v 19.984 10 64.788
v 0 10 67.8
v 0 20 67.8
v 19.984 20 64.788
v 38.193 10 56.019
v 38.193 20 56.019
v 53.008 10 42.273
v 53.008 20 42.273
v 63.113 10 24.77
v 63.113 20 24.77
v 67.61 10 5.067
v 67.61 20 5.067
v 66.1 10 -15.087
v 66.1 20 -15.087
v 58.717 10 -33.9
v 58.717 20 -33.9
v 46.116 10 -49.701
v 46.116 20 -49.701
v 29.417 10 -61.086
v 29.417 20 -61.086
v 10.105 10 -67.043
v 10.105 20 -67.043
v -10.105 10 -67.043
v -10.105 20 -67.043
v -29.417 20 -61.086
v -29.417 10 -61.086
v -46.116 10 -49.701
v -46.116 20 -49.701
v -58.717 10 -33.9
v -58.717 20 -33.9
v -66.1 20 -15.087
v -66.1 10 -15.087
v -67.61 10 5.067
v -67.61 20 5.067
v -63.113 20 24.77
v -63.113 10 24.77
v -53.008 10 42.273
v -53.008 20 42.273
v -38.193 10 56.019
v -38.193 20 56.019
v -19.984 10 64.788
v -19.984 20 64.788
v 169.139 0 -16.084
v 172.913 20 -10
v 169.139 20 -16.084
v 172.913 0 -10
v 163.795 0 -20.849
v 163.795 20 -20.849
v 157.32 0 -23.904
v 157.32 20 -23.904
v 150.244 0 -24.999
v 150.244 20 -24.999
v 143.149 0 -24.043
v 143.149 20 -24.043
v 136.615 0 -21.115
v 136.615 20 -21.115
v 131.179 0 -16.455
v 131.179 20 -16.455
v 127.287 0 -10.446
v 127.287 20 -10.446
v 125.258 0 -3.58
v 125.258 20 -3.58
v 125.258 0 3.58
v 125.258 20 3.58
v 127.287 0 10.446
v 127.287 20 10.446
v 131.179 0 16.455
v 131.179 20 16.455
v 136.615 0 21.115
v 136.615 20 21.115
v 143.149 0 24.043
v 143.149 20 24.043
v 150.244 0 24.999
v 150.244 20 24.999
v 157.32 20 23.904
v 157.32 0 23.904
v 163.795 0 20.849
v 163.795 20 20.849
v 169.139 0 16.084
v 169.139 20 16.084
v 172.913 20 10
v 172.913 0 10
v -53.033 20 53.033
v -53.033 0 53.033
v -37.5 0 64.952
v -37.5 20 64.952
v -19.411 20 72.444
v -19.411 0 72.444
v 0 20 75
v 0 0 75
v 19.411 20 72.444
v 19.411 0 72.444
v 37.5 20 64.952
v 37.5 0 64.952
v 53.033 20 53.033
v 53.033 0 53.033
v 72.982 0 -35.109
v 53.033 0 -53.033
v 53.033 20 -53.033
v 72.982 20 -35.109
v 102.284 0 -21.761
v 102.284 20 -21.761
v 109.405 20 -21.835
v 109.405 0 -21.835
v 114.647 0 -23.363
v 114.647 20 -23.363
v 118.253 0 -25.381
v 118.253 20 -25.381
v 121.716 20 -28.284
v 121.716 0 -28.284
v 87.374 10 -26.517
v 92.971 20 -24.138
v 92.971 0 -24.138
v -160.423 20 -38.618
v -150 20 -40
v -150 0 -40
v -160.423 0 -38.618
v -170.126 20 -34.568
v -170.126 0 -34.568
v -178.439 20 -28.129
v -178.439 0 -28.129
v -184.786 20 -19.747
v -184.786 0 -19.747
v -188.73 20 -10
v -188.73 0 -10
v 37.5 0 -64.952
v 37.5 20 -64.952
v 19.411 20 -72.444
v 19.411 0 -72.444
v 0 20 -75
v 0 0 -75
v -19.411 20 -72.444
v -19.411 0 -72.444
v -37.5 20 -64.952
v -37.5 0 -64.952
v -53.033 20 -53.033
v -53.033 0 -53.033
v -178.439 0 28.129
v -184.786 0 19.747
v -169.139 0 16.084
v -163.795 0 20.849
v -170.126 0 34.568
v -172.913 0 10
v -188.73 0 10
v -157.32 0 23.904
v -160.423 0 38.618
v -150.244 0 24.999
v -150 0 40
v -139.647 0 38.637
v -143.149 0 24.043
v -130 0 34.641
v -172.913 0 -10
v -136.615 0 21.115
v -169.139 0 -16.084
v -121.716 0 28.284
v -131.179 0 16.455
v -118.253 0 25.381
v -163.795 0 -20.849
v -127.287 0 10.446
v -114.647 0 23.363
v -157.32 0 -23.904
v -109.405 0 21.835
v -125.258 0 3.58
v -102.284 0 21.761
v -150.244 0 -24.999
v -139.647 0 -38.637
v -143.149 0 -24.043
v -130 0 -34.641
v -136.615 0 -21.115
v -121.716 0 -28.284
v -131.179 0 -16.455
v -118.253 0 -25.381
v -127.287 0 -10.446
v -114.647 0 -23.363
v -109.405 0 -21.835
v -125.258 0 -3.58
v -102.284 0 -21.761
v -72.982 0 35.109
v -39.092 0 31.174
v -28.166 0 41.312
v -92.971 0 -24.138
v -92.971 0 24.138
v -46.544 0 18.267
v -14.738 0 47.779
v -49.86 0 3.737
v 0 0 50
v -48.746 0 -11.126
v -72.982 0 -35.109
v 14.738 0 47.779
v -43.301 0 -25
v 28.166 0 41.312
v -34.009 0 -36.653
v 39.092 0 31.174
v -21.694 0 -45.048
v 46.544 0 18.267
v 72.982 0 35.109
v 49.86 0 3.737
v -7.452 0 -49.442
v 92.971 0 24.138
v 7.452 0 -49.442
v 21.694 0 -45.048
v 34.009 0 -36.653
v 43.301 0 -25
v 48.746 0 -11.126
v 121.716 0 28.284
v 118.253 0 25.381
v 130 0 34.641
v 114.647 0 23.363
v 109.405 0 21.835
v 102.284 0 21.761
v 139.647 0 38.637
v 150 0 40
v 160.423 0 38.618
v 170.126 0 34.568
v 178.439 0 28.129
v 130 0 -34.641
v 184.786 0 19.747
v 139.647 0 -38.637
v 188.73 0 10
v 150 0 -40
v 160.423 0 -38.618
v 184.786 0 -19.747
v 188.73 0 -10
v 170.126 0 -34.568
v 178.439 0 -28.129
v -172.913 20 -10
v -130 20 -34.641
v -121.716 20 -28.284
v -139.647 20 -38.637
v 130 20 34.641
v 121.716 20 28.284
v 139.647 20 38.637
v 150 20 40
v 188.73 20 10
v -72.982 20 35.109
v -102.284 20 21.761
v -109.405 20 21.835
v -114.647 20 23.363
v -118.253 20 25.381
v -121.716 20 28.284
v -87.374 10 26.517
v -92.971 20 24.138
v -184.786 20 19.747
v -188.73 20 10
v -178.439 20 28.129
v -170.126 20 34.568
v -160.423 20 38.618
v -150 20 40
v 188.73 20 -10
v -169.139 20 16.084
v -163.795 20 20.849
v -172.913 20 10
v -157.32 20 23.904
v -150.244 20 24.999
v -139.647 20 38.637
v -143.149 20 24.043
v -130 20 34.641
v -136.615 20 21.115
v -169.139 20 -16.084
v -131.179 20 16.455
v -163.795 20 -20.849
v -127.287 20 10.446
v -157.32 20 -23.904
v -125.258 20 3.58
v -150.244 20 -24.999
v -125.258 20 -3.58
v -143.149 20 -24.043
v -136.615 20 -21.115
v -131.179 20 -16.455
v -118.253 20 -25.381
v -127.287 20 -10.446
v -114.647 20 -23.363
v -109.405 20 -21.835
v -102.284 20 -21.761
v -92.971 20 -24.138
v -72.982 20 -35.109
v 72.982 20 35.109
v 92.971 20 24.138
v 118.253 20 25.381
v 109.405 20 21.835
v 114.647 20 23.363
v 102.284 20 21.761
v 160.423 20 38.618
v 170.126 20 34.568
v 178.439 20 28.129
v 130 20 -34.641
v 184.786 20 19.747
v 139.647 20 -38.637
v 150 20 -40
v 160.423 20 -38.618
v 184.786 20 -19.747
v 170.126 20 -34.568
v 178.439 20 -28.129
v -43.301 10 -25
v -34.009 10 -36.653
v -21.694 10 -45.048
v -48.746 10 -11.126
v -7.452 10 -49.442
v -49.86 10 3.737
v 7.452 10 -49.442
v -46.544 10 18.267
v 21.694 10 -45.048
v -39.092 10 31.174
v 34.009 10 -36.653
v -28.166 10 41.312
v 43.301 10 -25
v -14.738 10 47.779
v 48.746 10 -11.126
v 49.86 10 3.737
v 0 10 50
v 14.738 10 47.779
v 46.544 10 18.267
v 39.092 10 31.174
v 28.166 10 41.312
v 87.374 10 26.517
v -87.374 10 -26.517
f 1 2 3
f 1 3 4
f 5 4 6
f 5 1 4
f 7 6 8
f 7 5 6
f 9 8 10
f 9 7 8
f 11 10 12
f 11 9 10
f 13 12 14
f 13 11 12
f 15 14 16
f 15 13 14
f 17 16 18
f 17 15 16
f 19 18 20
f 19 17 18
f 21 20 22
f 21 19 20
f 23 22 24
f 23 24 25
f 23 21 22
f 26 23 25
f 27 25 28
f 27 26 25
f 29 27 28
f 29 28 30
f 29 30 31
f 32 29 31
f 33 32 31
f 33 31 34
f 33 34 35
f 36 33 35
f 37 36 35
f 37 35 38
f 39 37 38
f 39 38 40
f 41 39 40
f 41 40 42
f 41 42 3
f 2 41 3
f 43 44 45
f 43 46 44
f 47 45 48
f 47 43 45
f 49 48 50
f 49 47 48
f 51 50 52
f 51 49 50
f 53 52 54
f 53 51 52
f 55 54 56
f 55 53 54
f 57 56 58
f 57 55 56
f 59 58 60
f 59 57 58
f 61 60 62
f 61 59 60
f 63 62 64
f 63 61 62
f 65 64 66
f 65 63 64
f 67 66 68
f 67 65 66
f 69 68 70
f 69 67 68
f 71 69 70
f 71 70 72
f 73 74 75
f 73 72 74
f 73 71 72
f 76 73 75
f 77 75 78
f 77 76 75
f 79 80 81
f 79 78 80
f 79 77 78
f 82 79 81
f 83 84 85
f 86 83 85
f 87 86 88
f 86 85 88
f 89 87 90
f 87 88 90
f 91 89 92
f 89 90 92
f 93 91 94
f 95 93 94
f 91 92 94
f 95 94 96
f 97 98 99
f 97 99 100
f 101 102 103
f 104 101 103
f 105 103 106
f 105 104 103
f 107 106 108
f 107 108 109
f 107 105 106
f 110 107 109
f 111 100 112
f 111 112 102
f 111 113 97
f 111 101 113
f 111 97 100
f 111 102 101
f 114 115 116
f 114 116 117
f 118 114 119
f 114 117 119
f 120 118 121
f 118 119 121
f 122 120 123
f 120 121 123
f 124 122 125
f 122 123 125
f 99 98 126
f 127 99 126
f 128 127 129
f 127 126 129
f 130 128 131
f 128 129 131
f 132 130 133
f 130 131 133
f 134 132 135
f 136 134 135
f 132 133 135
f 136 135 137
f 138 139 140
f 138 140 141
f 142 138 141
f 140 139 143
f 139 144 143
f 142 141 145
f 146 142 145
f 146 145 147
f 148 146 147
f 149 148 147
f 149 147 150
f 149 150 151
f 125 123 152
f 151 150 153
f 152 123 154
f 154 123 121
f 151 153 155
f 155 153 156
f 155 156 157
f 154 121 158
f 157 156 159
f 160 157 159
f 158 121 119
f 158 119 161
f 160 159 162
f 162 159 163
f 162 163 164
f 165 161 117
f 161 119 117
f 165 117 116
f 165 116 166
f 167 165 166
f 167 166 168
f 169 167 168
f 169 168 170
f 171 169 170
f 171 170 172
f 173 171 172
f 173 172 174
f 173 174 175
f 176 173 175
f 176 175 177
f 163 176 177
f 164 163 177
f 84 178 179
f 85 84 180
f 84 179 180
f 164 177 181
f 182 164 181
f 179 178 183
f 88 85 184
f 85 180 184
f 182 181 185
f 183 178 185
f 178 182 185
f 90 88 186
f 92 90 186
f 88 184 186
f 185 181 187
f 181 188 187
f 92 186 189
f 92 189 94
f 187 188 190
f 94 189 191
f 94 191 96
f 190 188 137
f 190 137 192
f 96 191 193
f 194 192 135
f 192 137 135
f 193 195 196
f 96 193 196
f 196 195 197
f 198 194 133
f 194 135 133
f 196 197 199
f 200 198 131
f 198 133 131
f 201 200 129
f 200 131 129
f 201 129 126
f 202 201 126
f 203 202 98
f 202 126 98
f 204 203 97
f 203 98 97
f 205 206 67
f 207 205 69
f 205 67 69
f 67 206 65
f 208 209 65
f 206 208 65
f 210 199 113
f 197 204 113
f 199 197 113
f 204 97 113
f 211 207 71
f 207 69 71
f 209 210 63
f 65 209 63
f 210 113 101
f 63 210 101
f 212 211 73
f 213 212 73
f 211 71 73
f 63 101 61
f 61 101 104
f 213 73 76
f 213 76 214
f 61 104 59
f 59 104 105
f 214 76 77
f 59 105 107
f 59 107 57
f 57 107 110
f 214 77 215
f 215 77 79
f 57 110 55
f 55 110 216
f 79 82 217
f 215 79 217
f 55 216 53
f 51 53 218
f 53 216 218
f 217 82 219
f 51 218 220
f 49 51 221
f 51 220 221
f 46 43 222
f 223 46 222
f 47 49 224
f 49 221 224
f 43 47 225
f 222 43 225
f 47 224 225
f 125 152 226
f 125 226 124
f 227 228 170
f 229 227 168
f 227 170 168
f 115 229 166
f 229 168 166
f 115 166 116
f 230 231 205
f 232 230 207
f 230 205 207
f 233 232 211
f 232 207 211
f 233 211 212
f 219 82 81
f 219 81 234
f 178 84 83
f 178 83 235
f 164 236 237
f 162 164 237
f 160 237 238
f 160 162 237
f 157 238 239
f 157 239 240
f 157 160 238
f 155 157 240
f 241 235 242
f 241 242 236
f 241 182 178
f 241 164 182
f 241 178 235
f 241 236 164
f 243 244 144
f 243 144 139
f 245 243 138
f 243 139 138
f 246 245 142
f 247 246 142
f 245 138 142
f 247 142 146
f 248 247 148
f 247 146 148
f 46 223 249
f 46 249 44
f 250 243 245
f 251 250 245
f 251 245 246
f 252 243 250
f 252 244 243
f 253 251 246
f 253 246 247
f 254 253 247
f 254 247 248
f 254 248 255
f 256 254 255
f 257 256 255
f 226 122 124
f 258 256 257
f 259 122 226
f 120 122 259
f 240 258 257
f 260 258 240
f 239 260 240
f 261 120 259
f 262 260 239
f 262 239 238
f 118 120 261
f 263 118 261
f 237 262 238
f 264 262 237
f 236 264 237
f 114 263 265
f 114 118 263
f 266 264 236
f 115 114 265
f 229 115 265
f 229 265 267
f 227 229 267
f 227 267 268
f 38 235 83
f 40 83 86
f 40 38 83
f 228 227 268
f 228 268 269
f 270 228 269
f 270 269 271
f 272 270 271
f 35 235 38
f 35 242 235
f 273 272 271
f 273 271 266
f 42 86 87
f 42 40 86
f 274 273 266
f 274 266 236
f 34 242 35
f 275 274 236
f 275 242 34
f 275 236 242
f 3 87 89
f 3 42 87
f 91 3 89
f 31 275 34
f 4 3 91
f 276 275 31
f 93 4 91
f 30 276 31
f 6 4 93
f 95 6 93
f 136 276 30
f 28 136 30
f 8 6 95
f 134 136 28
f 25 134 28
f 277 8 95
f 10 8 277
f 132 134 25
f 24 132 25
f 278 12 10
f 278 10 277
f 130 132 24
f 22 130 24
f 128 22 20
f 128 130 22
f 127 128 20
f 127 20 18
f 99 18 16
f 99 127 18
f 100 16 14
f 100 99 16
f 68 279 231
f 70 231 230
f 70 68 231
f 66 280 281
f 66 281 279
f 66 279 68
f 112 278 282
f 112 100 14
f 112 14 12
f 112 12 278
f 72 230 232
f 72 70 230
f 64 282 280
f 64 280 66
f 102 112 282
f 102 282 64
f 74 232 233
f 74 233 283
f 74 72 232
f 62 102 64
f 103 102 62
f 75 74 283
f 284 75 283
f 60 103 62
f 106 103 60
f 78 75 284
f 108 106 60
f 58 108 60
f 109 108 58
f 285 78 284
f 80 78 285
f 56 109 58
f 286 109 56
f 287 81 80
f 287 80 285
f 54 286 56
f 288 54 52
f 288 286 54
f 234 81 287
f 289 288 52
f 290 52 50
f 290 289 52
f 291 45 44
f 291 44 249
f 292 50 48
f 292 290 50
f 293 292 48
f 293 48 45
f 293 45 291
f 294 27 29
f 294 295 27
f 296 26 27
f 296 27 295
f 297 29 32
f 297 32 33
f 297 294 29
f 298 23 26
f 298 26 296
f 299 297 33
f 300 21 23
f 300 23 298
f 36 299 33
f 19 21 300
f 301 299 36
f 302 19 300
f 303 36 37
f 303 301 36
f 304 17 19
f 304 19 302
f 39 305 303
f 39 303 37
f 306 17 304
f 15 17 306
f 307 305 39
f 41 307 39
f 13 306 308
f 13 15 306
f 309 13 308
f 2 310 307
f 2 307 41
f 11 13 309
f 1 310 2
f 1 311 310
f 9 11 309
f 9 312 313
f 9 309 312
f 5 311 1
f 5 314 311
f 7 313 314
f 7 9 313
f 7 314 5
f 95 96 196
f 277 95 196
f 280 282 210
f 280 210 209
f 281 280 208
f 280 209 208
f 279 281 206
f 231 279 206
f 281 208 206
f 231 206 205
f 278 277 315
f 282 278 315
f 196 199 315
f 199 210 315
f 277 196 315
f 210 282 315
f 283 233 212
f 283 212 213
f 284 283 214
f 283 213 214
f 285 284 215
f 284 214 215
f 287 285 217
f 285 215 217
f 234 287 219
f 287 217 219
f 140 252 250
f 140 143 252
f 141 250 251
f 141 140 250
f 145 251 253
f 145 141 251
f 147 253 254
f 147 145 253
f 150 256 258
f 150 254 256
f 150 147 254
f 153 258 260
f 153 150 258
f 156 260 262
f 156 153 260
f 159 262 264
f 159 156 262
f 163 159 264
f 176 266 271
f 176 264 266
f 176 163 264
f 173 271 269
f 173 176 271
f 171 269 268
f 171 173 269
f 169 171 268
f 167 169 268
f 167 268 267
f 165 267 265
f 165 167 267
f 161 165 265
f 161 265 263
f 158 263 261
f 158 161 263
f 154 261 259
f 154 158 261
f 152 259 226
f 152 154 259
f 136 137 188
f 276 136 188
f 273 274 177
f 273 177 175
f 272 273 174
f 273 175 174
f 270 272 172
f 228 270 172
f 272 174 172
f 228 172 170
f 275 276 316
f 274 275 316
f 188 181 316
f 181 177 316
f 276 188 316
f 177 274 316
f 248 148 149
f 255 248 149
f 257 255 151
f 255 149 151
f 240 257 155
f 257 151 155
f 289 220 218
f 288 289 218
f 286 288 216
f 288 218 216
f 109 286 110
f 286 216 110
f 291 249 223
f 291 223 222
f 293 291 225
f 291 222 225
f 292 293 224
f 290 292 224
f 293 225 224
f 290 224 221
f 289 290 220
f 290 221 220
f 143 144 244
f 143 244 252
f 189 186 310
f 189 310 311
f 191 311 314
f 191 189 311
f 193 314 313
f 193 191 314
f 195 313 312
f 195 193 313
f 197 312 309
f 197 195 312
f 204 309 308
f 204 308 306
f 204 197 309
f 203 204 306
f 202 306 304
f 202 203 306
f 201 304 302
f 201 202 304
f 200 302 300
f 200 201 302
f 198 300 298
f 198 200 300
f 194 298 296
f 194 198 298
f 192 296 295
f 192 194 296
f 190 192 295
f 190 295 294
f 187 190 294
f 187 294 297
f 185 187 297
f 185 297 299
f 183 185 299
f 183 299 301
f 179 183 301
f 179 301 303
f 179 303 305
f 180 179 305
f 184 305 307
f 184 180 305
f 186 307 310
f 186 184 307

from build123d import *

# Parameters (mm, degrees)
SKETCH1_R                = 67.8
SKETCH1_R_2              = 50
BOSS_EXTRUDE1_DEPTH      = 10
BOSS_EXTRUDE4_DEPTH      = 10
BOSS_EXTRUDE4_DEPTH_BACK = 10
SKETCH2_R                = 25
SKETCH2_R_2              = 67.8
CUT_EXTRUDE1_START       = -20
CUT_EXTRUDE1_DEPTH       = 20


# Read off the part's stored shape, not the designer's step: Cut-Extrude1
with BuildPart() as part:
    # Sketch1 → Boss-Extrude1 (new body)
    with BuildSketch(Plane(origin=(0, 0, 0), x_dir=(1, 0, 0), z_dir=(0, 1, 0))):
        with Locations(Location((0, 0, 0), (0, 0, 270))):
            Circle(SKETCH1_R)
        with Locations(Location((0, 0, 0), (0, 0, 270))):
            Circle(SKETCH1_R_2, mode=Mode.SUBTRACT)
    extrude(amount=BOSS_EXTRUDE1_DEPTH)

    # Sketch2 → Boss-Extrude4 (add, two sides: drawn at the far end of the back side and taken through both)
    with BuildSketch(Plane(origin=(0, 10, 0), x_dir=(1, 0, 0), z_dir=(0, 1, 0)).offset(-BOSS_EXTRUDE4_DEPTH_BACK)):
        with BuildLine():
            ThreePointArc((150, -40), (190, 0), (150, 40))
            ThreePointArc((150, 40), (134.692662705, 36.9551813), (121.715728753, 28.284271247))
            add(Edge.make_bspline(
                [(53.033008589, 53.033008589), (65.214190565, 40.851826613), (81.157405982, 26.386889755), (111.148754798, 17.717297293), (121.715728753, 28.284271247)],
                knots=[0, 0, 0, 0, 0.557862637, 1, 1, 1, 1], degree=3))
            ThreePointArc((53.033008589, 53.033008589), (0, 75), (-53.033008589, 53.033008589))
            add(Edge.make_bspline(
                [(-53.033008589, 53.033008589), (-65.214190565, 40.851826613), (-81.157405982, 26.386889755), (-111.148754798, 17.717297293), (-121.715728753, 28.284271247)],
                knots=[0, 0, 0, 0, 0.557862637, 1, 1, 1, 1], degree=3))
            ThreePointArc((-121.715728753, 28.284271247), (-134.692662705, 36.9551813), (-150, 40))
            ThreePointArc((-150, 40), (-190, 0), (-150, -40))
            ThreePointArc((-150, -40), (-134.692662705, -36.9551813), (-121.715728753, -28.284271247))
            add(Edge.make_bspline(
                [(-53.033008589, -53.033008589), (-65.214190565, -40.851826613), (-81.157405982, -26.386889755), (-111.148754798, -17.717297293), (-121.715728753, -28.284271247)],
                knots=[0, 0, 0, 0, 0.557862637, 1, 1, 1, 1], degree=3))
            ThreePointArc((-53.033008589, -53.033008589), (0, -75), (53.033008589, -53.033008589))
            add(Edge.make_bspline(
                [(53.033008589, -53.033008589), (65.214190565, -40.851826613), (81.157405982, -26.386889755), (111.148754798, -17.717297293), (121.715728753, -28.284271247)],
                knots=[0, 0, 0, 0, 0.557862637, 1, 1, 1, 1], degree=3))
            ThreePointArc((121.715728753, -28.284271247), (134.692662705, -36.9551813), (150, -40))
        make_face()
        with Locations(Location((-150, 0, 0), (0, 0, 270))):
            Circle(SKETCH2_R, mode=Mode.SUBTRACT)
        with Locations(Location((0, 0, 0), (0, 0, 270))):
            Circle(SKETCH2_R_2, mode=Mode.SUBTRACT)
        with Locations(Location((150, 0, 0), (0, 0, 270))):
            Circle(SKETCH2_R, mode=Mode.SUBTRACT)
    extrude(amount=BOSS_EXTRUDE4_DEPTH + BOSS_EXTRUDE4_DEPTH_BACK)

    # Cut-Extrude1 outline → Cut-Extrude1 (cut)
    with BuildSketch(Plane(origin=(0, 20, 0), x_dir=(1, 0, 0), z_dir=(0, 1, 0)).offset(CUT_EXTRUDE1_START)):
        with BuildLine():
            ThreePointArc((188.729833462, -10), (190, 0), (188.729833462, 10))
            Line((188.729833462, 10), (172.912878475, 10))
            ThreePointArc((172.912878475, 10), (175, 0), (172.912878475, -10))
            Line((172.912878475, -10), (188.729833462, -10))
        make_face()
        with BuildLine():
            ThreePointArc((-172.912878475, -10), (-175, 0), (-172.912878475, 10))
            Line((-172.912878475, 10), (-188.729833462, 10))
            ThreePointArc((-188.729833462, 10), (-190, 0), (-188.729833462, -10))
            Line((-188.729833462, -10), (-172.912878475, -10))
        make_face()
    extrude(amount=CUT_EXTRUDE1_DEPTH, mode=Mode.SUBTRACT)


solid = part.part
